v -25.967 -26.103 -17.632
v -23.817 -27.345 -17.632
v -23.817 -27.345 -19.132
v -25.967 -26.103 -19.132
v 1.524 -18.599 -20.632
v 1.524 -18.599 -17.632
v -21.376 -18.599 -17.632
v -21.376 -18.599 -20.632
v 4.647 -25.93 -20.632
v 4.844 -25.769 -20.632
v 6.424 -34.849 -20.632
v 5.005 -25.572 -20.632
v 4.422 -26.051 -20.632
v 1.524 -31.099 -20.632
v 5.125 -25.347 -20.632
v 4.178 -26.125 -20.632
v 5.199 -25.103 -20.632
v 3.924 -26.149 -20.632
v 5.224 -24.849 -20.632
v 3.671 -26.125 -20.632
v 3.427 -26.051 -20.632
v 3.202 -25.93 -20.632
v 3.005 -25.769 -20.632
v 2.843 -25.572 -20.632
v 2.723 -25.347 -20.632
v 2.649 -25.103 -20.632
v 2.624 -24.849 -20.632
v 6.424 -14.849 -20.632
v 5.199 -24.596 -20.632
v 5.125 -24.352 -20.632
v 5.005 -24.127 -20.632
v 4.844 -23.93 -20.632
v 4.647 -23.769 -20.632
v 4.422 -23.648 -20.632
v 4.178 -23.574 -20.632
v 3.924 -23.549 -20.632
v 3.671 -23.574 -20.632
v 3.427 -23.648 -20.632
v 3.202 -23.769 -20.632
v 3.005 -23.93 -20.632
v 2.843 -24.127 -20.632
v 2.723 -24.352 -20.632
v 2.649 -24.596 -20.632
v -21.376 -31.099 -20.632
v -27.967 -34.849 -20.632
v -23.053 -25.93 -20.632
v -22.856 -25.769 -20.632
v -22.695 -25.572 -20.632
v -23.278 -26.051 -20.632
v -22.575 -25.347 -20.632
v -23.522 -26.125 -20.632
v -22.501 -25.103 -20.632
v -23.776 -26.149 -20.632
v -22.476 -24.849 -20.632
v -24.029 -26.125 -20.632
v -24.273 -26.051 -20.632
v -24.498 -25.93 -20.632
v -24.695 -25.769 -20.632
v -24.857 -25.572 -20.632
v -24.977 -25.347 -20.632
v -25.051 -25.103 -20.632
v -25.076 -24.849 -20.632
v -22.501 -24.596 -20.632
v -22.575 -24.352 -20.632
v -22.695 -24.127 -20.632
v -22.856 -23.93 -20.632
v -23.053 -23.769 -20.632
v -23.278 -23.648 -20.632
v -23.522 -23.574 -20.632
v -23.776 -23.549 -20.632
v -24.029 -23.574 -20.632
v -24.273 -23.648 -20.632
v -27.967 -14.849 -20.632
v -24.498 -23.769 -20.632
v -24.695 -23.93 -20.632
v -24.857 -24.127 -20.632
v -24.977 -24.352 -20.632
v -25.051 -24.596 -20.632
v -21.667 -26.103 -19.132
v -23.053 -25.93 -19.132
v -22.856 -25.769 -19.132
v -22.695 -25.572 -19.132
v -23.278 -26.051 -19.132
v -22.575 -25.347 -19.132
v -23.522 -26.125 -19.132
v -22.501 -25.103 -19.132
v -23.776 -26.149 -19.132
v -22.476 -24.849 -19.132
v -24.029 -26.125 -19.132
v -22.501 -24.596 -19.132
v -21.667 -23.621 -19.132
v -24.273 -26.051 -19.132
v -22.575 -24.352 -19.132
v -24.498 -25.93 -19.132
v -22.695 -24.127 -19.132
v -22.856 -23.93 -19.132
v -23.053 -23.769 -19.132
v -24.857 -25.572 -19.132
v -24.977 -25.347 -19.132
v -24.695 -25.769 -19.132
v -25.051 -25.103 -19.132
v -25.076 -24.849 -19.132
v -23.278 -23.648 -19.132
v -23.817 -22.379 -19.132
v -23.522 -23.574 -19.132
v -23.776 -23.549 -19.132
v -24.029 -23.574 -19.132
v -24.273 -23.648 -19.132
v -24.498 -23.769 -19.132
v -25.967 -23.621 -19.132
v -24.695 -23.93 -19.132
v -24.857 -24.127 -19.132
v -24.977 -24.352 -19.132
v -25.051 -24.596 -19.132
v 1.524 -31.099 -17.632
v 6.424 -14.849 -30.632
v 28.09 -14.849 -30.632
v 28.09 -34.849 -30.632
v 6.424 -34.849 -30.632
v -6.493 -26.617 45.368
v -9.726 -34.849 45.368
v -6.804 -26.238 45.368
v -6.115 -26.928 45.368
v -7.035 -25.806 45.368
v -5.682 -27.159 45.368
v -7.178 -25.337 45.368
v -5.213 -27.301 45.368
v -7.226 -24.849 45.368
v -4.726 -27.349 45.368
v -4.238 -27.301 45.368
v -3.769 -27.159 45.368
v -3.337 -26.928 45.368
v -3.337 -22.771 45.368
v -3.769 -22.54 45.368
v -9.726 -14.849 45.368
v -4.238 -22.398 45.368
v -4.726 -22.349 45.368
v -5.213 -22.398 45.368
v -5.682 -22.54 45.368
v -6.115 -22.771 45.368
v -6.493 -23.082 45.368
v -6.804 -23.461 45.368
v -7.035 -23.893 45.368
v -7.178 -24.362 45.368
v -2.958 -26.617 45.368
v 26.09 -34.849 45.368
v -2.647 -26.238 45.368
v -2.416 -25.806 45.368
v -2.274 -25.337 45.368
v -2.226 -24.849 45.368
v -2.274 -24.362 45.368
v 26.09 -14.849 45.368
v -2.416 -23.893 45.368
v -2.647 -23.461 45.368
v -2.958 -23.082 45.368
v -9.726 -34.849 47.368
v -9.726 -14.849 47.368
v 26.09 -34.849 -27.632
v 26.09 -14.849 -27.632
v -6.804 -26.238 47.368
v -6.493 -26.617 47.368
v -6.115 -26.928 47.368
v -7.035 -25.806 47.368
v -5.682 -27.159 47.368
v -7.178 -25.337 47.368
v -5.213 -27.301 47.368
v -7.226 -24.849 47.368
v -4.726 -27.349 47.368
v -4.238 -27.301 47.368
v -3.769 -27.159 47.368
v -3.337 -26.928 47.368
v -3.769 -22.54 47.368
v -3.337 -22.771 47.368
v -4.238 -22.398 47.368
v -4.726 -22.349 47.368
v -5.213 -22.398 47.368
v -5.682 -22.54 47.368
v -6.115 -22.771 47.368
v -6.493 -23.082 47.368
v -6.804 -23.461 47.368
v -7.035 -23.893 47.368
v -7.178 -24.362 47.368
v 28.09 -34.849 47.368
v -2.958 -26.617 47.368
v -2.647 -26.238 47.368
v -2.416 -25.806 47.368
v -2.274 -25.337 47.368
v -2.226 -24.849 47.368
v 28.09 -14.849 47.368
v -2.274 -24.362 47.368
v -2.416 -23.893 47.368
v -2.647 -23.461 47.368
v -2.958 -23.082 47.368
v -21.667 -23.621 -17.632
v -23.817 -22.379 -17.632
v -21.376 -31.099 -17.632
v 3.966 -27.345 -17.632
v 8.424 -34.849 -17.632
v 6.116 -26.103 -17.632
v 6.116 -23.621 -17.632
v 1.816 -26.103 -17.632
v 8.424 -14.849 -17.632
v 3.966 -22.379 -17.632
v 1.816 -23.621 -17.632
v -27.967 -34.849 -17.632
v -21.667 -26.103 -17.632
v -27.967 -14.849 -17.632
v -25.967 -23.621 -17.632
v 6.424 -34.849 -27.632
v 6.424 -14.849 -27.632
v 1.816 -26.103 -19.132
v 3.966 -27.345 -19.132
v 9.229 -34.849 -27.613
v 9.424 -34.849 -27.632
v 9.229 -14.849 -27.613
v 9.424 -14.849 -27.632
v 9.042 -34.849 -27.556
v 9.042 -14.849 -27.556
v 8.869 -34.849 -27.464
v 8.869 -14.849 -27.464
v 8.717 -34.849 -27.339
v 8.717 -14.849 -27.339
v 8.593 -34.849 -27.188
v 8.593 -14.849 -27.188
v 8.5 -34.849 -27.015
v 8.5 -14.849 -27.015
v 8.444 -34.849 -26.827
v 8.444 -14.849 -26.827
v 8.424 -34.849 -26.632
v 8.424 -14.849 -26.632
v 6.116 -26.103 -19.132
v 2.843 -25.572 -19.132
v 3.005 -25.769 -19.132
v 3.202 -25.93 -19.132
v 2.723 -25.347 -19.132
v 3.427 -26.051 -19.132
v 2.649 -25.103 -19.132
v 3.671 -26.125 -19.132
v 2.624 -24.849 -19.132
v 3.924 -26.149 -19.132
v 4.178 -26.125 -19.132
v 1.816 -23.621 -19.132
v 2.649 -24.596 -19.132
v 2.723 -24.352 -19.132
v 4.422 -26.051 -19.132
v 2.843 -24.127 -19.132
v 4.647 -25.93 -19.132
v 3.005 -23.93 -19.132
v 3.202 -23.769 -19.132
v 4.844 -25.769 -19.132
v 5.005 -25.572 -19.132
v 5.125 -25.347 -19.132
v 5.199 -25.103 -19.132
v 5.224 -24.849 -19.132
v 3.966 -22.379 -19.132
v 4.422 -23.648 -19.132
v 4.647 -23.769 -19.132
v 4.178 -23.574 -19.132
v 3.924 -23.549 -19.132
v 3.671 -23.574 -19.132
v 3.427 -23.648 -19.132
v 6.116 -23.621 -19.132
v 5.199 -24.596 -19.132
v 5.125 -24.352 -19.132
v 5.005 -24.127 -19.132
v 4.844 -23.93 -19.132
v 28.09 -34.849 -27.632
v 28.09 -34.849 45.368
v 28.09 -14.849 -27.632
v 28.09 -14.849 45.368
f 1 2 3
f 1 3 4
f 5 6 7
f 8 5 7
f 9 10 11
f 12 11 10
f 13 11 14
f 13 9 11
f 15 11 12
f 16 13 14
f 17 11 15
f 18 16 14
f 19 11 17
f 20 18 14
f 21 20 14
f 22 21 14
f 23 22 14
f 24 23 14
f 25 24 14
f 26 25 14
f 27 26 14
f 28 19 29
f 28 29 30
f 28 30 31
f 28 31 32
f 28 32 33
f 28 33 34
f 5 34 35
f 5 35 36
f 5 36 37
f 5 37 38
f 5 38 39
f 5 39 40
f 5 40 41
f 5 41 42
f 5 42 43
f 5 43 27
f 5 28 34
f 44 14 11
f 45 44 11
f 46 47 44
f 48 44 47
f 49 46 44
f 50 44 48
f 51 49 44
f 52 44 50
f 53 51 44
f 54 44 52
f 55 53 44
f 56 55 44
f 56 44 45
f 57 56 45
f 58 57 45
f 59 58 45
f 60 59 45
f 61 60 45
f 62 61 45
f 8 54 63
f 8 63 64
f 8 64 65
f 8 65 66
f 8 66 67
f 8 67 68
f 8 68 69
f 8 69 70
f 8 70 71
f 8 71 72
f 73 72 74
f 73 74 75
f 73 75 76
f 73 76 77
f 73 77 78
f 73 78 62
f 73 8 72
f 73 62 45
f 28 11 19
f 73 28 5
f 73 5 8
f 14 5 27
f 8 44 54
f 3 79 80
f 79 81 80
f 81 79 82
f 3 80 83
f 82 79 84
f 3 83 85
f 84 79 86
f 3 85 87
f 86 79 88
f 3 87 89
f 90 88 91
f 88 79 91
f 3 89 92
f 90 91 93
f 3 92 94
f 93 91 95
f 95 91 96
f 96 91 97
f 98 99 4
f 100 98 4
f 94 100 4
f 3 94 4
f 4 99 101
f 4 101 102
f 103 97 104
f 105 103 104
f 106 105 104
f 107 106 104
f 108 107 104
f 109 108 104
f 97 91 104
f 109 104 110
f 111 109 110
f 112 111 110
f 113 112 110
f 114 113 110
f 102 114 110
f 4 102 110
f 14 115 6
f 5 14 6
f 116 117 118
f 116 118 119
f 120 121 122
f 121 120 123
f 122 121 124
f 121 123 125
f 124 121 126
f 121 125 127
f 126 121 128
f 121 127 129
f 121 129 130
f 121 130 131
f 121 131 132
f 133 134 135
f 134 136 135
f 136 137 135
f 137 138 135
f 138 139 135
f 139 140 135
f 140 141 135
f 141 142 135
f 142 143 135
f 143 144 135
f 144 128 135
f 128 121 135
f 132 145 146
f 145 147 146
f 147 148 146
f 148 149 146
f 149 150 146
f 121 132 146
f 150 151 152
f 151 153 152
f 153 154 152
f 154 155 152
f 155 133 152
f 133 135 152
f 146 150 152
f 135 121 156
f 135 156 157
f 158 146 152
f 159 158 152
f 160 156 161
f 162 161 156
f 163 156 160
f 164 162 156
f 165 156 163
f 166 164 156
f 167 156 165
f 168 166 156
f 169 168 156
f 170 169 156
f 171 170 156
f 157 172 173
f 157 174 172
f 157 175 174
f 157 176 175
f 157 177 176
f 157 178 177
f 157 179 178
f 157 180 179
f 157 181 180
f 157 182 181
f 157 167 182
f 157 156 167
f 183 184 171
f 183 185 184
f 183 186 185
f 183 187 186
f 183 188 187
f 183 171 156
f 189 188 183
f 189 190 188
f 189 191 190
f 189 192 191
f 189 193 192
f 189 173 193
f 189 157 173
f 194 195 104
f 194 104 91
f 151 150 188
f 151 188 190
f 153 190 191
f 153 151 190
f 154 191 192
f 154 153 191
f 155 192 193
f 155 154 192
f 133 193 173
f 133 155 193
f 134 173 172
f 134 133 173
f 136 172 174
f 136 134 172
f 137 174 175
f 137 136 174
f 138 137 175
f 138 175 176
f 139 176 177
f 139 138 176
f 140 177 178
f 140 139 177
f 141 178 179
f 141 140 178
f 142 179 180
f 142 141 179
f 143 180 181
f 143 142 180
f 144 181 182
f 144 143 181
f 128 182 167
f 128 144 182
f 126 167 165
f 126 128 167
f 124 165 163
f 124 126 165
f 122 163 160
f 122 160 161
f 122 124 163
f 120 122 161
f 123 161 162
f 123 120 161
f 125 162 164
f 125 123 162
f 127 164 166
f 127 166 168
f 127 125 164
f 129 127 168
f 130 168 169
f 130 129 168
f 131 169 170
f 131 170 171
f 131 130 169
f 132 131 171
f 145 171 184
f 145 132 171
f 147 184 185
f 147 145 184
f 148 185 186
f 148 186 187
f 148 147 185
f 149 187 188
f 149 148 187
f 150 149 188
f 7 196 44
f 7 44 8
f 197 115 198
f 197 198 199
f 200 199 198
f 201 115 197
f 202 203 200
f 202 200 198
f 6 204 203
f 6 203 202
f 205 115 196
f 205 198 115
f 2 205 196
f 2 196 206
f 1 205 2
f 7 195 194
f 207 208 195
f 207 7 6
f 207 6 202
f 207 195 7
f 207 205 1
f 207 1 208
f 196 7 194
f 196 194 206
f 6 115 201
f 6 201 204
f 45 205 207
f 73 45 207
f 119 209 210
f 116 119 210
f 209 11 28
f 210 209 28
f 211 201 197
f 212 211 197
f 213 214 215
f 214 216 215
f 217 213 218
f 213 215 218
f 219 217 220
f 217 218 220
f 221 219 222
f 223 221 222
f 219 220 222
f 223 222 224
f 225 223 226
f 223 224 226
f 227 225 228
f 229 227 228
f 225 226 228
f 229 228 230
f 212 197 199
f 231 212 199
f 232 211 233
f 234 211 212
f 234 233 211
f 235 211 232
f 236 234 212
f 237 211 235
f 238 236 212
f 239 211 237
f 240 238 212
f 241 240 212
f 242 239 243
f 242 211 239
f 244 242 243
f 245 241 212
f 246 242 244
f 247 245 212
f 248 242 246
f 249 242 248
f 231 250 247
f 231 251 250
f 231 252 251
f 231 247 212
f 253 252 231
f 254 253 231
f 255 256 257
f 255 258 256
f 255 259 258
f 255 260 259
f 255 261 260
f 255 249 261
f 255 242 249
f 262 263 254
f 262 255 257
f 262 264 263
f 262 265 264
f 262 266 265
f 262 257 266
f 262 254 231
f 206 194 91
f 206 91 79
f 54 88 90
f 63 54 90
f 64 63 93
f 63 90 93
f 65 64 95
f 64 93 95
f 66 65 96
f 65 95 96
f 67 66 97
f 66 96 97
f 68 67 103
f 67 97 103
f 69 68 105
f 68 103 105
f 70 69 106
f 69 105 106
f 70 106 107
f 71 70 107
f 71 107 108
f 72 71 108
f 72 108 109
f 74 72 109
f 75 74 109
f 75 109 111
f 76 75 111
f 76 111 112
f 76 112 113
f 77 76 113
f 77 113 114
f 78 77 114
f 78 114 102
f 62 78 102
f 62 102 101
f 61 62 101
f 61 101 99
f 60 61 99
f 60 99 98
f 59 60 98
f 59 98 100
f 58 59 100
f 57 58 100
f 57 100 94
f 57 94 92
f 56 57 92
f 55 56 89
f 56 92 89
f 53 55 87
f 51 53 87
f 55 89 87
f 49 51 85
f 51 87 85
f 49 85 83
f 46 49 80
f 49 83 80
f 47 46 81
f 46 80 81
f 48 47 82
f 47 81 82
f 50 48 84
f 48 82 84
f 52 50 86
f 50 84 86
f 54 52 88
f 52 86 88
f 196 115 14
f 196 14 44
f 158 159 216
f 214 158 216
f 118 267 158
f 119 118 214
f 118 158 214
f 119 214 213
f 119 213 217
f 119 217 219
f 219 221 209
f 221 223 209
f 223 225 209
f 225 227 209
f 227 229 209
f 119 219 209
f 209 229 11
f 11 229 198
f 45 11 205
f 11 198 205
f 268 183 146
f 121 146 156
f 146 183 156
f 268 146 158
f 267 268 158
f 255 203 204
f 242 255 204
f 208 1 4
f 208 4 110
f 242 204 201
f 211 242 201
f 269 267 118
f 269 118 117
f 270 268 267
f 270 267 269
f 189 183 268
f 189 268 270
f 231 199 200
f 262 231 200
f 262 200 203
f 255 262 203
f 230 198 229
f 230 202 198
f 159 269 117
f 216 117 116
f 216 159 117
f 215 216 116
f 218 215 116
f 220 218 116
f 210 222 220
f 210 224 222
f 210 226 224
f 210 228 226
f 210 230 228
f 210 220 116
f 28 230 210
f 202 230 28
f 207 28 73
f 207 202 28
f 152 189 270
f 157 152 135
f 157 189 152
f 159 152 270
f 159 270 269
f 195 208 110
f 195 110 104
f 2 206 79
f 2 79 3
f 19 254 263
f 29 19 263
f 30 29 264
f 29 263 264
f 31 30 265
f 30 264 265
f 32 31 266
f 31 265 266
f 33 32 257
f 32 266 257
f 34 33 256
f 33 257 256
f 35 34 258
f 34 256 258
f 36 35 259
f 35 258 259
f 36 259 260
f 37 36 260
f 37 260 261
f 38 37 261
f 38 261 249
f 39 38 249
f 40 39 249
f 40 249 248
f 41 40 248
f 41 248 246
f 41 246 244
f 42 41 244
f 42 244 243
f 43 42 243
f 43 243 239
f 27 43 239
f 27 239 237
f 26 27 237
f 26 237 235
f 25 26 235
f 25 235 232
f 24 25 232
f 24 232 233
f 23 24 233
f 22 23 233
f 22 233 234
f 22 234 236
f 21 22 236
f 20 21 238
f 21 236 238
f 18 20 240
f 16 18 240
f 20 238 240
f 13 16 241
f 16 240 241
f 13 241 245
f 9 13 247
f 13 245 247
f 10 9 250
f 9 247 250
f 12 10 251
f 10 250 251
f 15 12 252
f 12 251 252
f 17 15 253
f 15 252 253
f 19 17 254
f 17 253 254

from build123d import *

# Parameters (mm, degrees)
BOSS_EXTRUDE1_START       = 26.09
SKETCH2_W                 = 20
SKETCH2_H                 = 73
BOSS_EXTRUDE1_DEPTH       = 2
SKETCH3_W                 = 37.815629263
SKETCH3_H                 = 20
SKETCH3_R                 = 2.5
BOSS_EXTRUDE2_DEPTH       = 2
BOSS_EXTRUDE3_START       = -3
BOSS_EXTRUDE3_OUTLINE_W   = 34.391343997
BOSS_EXTRUDE3_OUTLINE_H   = 20
BOSS_EXTRUDE3_OUTLINE_R   = 1.1
BOSS_EXTRUDE3_OUTLINE_W_2 = 22.89999
BOSS_EXTRUDE3_OUTLINE_H_2 = 12.5
BOSS_EXTRUDE3_DEPTH       = 3
SKETCH7_W                 = 10
SKETCH7_H                 = 20
BOSS_EXTRUDE4_DEPTH       = 2
SKETCH8_W                 = 21.665624263
SKETCH8_H                 = 20
BOSS_EXTRUDE5_DEPTH       = 3
FILLET1_R                 = 1
CUT_EXTRUDE5_START        = -3
SKETCH4_3_R               = 1.1
CUT_EXTRUDE5_DEPTH        = 1.5
M2_CLEARANCE_HOLE1_D      = 2.6
M2_CLEARANCE_HOLE1_DEPTH  = 3
M2_CLEARANCE_HOLE1_TIP    = 0.781118805


# Read off the part's stored shape, not the designer's step: Boss-Extrude3
with BuildPart() as part:
    # Sketch2 → Boss-Extrude1 (new body)
    with BuildSketch(Plane(origin=(0, 0, 13.2), x_dir=(0, 1, 0), z_dir=(1, 0, 0)).offset(BOSS_EXTRUDE1_START)):
        with Locations((-24.849481376, -4.332139258)):
            Rectangle(SKETCH2_W, SKETCH2_H)
    extrude(amount=BOSS_EXTRUDE1_DEPTH)

    # Sketch3 → Boss-Extrude2 (add)
    with BuildSketch(Plane.XY.offset(45.367860742)):
        with Locations((9.182185369, -24.849481376)):
            Rectangle(SKETCH3_W, SKETCH3_H)
        with Locations((-4.725629263, -24.849481376)):
            Circle(SKETCH3_R, mode=Mode.SUBTRACT)
    extrude(amount=BOSS_EXTRUDE2_DEPTH)



with BuildPart() as body_2:
    # Boss-Extrude3 outline → Boss-Extrude3 (new body)
    with BuildSketch(Plane(origin=(0, 0, -20.632139258), x_dir=(-1, 0, 0), z_dir=(0, 0, -1)).offset(BOSS_EXTRUDE3_START)):
        with Locations((10.771296262, -24.849481376)):
            Rectangle(BOSS_EXTRUDE3_OUTLINE_W, BOSS_EXTRUDE3_OUTLINE_H)
        with Locations((-3.924375737, -24.849481376)):
            Circle(BOSS_EXTRUDE3_OUTLINE_R, mode=Mode.SUBTRACT)
        with Locations((9.925624263, -24.849481376)):
            Rectangle(BOSS_EXTRUDE3_OUTLINE_W_2, BOSS_EXTRUDE3_OUTLINE_H_2, mode=Mode.SUBTRACT)
        with Locations((23.775624263, -24.849481376)):
            Circle(BOSS_EXTRUDE3_OUTLINE_R, mode=Mode.SUBTRACT)
    extrude(amount=BOSS_EXTRUDE3_DEPTH)

    # Sketch7 → Boss-Extrude4 (add)
    with BuildSketch(Plane(origin=(6.424375737, 0, 0), x_dir=(0, 0, -1), z_dir=(1, 0, 0))):
        with Locations((22.632139258, -24.849481376)):
            Rectangle(SKETCH7_W, SKETCH7_H)
    extrude(amount=BOSS_EXTRUDE4_DEPTH)


with BuildPart() as part_1:
    add(part.part)

    add(body_2.part)  # Boss-Extrude5 merges body 2
    # Sketch8 → Boss-Extrude5 (add)
    with BuildSketch(Plane(origin=(0, 0, -27.632139258), x_dir=(-1, 0, 0), z_dir=(0, 0, -1))):
        with Locations((-17.257187869, -24.849481376)):
            Rectangle(SKETCH8_W, SKETCH8_H)
    extrude(amount=BOSS_EXTRUDE5_DEPTH)

    # Fillet1
    fillet1_edges = [part_1.edges().sort_by_distance(p)[0] for p in [
        (8.424375737, -24.849481376, -27.632139258),
    ]]
    fillet(fillet1_edges, radius=FILLET1_R)

    # Sketch4<3> → Cut-Extrude5 (cut)
    # profile 1 of 4: a face of its own
    with BuildSketch(Plane(origin=(0, 0, -20.632139258), x_dir=(-1, 0, 0), z_dir=(0, 0, -1)).offset(CUT_EXTRUDE5_START)):
        Polygon((-3.965719734, -22.379328504), (-1.815719734, -23.620631583), (-1.815719734, -26.103237741), (-3.965719734, -27.344540819), (-6.115719734, -26.103237741), (-6.115719734, -23.620631583), align=None)
        with Locations((-3.924375737, -24.849481376)):
            Circle(SKETCH4_3_R, mode=Mode.SUBTRACT)
    # profile 2 of 4: a face of its own
    with BuildSketch(Plane(origin=(0, 0, -20.632139258), x_dir=(-1, 0, 0), z_dir=(0, 0, -1)).offset(CUT_EXTRUDE5_START)):
        Polygon((23.81696826, -22.379328504), (21.66696826, -23.620631583), (21.66696826, -26.103237741), (23.81696826, -27.344540819), (25.96696826, -26.103237741), (25.96696826, -23.620631583), align=None)
        with Locations(Location((23.775624263, -24.849481376, 0), (0, 0, 180))):
            Circle(SKETCH4_3_R, mode=Mode.SUBTRACT)
    # profile 3 of 4: a face of its own
    with BuildSketch(Plane(origin=(0, 0, -20.632139258), x_dir=(-1, 0, 0), z_dir=(0, 0, -1)).offset(CUT_EXTRUDE5_START)):
        with Locations((-3.924375737, -24.849481376)):
            Circle(SKETCH4_3_R)
    # profile 4 of 4: a face of its own
    with BuildSketch(Plane(origin=(0, 0, -20.632139258), x_dir=(-1, 0, 0), z_dir=(0, 0, -1)).offset(CUT_EXTRUDE5_START)):
        with Locations(Location((23.775624263, -24.849481376, 0), (0, 0, 180))):
            Circle(SKETCH4_3_R)
    extrude(amount=CUT_EXTRUDE5_DEPTH, mode=Mode.SUBTRACT)

    # M2 Clearance Hole1
    with Locations(Plane(origin=(0, 0, -20.632139258), x_dir=(-1, 0, 0), z_dir=(0, 0, -1))):
        with Locations((-3.924375737, -24.849481376), (23.775624263, -24.849481376)):
            Hole(M2_CLEARANCE_HOLE1_D / 2, depth=M2_CLEARANCE_HOLE1_DEPTH)
            with Locations((0, 0, -(M2_CLEARANCE_HOLE1_DEPTH + M2_CLEARANCE_HOLE1_TIP / 2))):  # 118° drill point
                Cone(0, M2_CLEARANCE_HOLE1_D / 2, M2_CLEARANCE_HOLE1_TIP, mode=Mode.SUBTRACT)


solid = part_1.part
